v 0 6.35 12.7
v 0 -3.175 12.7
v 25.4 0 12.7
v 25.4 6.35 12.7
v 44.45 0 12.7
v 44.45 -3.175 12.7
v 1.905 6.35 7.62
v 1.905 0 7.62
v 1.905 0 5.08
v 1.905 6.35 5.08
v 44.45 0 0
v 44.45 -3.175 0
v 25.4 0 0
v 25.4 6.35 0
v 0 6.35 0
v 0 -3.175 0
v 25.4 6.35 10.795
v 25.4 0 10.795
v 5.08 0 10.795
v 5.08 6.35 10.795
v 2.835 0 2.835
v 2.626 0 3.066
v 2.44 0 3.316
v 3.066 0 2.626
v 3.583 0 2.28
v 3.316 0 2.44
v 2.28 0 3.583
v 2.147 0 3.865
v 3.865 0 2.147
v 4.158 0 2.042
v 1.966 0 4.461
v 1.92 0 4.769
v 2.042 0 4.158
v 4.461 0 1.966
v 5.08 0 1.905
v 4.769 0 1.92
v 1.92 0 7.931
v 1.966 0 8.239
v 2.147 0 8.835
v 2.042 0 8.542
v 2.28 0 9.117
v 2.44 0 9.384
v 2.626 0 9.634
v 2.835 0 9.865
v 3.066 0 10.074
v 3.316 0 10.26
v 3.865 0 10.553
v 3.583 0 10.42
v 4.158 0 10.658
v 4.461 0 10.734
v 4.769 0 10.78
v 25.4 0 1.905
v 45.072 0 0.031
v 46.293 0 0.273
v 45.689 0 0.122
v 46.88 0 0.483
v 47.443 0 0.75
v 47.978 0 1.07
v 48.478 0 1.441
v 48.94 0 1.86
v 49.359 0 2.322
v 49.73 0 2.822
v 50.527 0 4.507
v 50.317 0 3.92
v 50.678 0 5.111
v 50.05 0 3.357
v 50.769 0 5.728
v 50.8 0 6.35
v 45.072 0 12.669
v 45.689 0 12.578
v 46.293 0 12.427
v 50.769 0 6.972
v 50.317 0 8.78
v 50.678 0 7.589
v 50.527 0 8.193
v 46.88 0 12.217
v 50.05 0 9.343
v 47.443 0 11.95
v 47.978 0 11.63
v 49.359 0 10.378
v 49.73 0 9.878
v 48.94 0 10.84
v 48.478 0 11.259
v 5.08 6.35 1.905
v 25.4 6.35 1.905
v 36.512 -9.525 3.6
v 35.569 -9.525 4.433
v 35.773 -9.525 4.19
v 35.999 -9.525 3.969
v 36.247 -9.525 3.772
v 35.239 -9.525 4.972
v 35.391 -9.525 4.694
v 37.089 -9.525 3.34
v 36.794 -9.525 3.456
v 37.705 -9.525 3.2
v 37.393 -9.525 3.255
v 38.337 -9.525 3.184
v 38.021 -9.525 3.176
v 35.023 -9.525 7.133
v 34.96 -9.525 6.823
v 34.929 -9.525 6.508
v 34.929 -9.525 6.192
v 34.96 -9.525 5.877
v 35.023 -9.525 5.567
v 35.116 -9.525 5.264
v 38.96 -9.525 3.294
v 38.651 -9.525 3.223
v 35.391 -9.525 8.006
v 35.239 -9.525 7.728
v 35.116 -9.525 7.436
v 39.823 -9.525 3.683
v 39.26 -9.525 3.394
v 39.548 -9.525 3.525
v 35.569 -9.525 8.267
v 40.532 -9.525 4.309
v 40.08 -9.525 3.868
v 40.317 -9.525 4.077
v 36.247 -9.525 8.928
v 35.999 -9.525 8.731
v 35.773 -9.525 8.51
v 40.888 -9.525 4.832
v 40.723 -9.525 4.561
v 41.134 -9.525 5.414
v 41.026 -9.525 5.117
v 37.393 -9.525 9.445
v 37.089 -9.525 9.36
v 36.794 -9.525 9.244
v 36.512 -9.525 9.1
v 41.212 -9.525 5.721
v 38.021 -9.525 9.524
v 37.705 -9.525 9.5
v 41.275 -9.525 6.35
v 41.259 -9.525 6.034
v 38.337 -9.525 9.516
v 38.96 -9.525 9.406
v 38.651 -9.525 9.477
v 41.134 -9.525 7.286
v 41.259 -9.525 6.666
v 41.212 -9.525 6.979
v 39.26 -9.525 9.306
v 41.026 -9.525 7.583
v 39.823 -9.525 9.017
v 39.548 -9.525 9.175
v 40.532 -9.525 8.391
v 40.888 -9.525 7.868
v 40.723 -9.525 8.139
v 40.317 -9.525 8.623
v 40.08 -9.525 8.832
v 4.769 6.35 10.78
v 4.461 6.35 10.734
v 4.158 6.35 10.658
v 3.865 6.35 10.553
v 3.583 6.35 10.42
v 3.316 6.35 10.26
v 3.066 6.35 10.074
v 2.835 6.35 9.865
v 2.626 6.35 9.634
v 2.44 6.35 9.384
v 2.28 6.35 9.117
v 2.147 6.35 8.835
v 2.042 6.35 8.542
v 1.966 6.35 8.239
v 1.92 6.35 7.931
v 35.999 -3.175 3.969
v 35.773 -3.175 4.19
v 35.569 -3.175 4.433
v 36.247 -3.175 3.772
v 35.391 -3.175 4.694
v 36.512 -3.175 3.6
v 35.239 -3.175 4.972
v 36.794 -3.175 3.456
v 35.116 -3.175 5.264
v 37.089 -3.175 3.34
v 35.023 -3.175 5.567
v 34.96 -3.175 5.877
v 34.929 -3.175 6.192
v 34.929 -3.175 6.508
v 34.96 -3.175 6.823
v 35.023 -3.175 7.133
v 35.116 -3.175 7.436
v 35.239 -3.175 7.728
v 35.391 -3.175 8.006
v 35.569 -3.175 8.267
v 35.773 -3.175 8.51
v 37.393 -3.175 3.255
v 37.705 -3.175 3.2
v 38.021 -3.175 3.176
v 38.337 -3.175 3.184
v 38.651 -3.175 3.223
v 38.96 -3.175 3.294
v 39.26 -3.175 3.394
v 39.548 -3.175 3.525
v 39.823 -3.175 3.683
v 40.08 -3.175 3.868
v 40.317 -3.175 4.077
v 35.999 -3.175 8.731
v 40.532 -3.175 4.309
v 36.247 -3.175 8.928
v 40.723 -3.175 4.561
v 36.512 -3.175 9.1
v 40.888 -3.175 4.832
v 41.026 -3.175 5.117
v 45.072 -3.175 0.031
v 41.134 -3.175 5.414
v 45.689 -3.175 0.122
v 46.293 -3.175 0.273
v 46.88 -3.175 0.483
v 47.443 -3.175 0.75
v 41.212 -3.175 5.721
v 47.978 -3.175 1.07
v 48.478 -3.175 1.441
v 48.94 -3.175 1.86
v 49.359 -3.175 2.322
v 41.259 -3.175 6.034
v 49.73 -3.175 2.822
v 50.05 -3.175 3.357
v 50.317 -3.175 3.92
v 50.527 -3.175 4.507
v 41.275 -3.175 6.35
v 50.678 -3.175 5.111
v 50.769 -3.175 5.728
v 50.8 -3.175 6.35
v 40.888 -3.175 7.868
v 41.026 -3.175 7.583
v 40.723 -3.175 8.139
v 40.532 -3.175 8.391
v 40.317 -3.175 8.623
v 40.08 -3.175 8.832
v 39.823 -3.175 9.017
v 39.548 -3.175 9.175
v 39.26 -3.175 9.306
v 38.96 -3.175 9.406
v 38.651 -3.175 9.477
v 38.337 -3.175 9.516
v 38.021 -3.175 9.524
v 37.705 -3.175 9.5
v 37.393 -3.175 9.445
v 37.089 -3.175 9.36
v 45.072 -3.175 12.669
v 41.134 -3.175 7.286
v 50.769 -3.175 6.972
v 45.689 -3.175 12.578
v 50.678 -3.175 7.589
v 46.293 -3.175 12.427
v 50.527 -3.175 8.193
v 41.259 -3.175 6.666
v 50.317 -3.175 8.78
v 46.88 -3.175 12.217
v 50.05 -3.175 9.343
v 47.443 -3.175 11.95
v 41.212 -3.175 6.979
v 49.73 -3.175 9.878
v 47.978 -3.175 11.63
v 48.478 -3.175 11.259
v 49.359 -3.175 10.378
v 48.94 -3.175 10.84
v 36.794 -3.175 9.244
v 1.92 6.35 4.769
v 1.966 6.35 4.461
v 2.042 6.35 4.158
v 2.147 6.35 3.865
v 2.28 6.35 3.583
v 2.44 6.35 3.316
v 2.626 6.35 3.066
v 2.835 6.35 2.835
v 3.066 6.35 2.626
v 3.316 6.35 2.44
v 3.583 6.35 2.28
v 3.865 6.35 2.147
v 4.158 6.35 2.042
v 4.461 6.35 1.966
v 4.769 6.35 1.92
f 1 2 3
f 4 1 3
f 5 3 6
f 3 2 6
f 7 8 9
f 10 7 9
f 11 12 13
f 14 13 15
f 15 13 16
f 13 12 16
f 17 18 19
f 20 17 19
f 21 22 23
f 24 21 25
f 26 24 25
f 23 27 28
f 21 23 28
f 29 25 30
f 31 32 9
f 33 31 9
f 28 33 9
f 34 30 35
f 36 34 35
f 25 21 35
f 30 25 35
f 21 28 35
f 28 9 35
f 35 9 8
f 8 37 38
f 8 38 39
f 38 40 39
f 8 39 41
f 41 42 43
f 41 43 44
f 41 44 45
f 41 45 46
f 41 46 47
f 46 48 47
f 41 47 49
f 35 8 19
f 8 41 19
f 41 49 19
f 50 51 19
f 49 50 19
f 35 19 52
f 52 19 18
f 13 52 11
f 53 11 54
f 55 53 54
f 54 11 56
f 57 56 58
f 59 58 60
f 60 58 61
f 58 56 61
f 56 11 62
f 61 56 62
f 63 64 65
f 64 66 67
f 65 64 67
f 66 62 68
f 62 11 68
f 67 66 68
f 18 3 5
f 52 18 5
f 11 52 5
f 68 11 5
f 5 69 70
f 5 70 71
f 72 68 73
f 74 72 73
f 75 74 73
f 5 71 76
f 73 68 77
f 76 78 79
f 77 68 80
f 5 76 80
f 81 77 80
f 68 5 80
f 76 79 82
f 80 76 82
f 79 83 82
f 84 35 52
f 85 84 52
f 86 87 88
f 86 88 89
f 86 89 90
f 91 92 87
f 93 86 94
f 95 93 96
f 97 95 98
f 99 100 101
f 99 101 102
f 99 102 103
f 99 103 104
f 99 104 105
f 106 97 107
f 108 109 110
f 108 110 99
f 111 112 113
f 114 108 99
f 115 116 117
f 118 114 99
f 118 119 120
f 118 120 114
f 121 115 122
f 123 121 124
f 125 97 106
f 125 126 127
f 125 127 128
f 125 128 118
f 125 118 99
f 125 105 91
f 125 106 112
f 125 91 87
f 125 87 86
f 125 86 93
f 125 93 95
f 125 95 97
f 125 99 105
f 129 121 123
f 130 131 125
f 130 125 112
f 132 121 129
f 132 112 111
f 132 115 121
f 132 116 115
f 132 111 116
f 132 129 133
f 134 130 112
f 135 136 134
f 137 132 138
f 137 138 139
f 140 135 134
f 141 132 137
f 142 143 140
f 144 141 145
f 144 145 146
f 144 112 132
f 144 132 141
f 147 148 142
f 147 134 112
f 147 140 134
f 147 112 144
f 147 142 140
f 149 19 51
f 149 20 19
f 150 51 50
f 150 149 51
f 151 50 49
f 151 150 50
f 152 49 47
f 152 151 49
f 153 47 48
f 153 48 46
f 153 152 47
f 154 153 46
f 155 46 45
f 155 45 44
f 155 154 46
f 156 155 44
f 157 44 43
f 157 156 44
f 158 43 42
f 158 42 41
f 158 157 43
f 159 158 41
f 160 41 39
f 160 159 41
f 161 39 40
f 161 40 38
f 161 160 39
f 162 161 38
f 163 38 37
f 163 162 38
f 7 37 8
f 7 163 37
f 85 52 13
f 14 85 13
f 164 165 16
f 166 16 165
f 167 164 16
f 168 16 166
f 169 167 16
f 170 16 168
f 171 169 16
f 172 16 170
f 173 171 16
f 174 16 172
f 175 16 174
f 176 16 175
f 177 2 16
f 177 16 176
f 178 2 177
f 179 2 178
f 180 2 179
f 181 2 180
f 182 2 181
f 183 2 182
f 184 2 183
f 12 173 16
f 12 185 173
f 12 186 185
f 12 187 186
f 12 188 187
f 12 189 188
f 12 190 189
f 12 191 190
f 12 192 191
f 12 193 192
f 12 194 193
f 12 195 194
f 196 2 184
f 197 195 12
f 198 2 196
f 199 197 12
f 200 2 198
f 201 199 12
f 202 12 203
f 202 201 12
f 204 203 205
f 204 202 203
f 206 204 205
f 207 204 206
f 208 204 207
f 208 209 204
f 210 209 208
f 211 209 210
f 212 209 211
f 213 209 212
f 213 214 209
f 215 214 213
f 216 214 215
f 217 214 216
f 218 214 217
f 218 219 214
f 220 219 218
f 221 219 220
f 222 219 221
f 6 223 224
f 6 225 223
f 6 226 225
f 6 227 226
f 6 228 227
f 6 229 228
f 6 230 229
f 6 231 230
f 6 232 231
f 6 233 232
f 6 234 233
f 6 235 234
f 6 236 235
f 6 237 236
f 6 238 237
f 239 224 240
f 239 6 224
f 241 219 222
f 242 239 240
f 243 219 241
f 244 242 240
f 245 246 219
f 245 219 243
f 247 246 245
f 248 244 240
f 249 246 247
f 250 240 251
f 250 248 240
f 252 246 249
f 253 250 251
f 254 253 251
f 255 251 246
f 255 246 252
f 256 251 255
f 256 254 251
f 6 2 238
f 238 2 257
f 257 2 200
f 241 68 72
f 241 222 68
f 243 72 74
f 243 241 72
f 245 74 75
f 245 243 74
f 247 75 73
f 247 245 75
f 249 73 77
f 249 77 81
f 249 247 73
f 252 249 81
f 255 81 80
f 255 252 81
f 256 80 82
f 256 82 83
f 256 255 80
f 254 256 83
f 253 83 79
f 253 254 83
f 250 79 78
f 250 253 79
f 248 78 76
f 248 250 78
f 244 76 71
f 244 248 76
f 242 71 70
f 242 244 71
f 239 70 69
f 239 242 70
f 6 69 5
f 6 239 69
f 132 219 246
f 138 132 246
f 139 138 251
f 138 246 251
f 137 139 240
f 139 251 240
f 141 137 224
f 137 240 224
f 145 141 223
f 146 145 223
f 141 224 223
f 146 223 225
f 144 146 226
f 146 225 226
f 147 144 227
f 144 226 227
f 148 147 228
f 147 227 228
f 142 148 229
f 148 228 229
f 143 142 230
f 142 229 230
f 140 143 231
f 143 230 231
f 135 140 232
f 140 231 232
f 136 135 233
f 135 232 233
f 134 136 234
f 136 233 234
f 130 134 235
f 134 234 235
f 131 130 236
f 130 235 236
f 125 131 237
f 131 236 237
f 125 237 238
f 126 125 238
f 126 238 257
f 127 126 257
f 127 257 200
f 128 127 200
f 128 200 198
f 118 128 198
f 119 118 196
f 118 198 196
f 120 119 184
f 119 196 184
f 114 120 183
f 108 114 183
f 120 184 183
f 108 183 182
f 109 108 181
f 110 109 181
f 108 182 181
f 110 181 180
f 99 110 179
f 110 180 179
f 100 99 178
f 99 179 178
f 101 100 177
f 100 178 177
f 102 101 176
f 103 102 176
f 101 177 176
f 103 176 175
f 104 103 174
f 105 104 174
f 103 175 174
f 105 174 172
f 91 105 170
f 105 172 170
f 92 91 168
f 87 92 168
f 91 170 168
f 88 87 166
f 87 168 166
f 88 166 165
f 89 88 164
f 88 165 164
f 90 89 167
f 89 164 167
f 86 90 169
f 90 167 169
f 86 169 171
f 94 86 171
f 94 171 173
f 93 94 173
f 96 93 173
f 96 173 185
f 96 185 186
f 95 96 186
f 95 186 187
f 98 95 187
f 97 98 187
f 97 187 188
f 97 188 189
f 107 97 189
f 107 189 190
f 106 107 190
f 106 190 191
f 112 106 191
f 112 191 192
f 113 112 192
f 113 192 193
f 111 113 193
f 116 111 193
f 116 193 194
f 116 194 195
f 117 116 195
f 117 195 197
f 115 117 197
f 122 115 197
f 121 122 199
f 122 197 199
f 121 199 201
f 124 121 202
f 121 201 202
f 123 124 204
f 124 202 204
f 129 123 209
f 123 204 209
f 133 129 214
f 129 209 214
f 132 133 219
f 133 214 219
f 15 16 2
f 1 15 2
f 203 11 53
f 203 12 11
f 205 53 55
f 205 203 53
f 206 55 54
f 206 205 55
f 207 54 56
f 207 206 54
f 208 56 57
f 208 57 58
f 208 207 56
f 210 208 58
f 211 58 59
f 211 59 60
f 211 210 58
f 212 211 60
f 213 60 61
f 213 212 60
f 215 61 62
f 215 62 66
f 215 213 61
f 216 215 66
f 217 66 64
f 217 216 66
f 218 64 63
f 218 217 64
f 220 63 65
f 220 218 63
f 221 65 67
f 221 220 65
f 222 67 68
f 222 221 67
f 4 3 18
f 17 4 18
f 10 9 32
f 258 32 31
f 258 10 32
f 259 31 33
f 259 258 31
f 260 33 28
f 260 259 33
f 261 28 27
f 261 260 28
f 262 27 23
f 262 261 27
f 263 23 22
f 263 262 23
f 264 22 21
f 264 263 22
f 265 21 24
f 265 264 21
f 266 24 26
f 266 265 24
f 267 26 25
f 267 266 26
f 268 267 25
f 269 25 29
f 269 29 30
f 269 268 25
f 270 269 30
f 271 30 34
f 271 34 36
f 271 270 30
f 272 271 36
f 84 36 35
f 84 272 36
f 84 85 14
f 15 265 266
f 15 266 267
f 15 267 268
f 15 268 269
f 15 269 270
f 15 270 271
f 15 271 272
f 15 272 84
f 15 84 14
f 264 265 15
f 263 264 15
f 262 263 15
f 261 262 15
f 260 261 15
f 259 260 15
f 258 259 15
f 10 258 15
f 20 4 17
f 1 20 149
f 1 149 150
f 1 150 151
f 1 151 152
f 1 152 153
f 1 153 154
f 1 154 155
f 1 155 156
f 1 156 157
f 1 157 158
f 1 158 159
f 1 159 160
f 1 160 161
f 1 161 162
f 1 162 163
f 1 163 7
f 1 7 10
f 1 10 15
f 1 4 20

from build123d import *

# Parameters (mm, degrees)
F0_W     = 50.8
F0_H     = 12.7
F1_DEPTH = 3.175
F2_R     = 3.175
F3_DEPTH = 6.35
F5_DEPTH = 6.35
F6_R     = 3.175
F7_R     = 6.34999


# Not quite as in the source:
# - a fillet or chamfer is up to 0.001 mm smaller than in the source, because OpenCascade refuses the exact size


with BuildPart() as f1:
    # F0 (on Front) → F1 (new body)
    with BuildSketch(Plane.XZ):
        with Locations((25.4, 6.35)):
            Rectangle(F0_W, F0_H)
    extrude(amount=F1_DEPTH)

    # F2 (on face) → F3 (join)
    with BuildSketch(Plane.XZ.offset(3.175)):
        with Locations((38.1, 6.35)):
            Circle(F2_R)
    extrude(amount=F3_DEPTH)

    # F4 (on face) → F5 (join)
    with BuildSketch(Plane(origin=(0, 0, 0), x_dir=(-1, 0, 0), z_dir=(0, 1, 0))):
        Polygon((0, 0), (0, 12.7), (-25.4, 12.7), (-25.4, 10.795), (-1.905, 10.795), (-1.905, 1.905), (-25.4, 1.905), (-25.4, 0), align=None)
    extrude(amount=F5_DEPTH)

    # F6
    f6_edges = [f1.edges().sort_by_distance(p)[0] for p in [
        (1.905, 3.175, 10.795),
        (1.905, 3.175, 1.905),
    ]]
    fillet(f6_edges, radius=F6_R)

    # F7 (radius 6.35 in the source; OpenCascade refuses exactly that, so slightly less here)
    f7_edges = [f1.edges().sort_by_distance(p)[0] for p in [
        (50.8, -1.5875, 12.7),
        (50.8, -1.5875, 0),
    ]]
    fillet(f7_edges, radius=F7_R)


solid = f1.part
